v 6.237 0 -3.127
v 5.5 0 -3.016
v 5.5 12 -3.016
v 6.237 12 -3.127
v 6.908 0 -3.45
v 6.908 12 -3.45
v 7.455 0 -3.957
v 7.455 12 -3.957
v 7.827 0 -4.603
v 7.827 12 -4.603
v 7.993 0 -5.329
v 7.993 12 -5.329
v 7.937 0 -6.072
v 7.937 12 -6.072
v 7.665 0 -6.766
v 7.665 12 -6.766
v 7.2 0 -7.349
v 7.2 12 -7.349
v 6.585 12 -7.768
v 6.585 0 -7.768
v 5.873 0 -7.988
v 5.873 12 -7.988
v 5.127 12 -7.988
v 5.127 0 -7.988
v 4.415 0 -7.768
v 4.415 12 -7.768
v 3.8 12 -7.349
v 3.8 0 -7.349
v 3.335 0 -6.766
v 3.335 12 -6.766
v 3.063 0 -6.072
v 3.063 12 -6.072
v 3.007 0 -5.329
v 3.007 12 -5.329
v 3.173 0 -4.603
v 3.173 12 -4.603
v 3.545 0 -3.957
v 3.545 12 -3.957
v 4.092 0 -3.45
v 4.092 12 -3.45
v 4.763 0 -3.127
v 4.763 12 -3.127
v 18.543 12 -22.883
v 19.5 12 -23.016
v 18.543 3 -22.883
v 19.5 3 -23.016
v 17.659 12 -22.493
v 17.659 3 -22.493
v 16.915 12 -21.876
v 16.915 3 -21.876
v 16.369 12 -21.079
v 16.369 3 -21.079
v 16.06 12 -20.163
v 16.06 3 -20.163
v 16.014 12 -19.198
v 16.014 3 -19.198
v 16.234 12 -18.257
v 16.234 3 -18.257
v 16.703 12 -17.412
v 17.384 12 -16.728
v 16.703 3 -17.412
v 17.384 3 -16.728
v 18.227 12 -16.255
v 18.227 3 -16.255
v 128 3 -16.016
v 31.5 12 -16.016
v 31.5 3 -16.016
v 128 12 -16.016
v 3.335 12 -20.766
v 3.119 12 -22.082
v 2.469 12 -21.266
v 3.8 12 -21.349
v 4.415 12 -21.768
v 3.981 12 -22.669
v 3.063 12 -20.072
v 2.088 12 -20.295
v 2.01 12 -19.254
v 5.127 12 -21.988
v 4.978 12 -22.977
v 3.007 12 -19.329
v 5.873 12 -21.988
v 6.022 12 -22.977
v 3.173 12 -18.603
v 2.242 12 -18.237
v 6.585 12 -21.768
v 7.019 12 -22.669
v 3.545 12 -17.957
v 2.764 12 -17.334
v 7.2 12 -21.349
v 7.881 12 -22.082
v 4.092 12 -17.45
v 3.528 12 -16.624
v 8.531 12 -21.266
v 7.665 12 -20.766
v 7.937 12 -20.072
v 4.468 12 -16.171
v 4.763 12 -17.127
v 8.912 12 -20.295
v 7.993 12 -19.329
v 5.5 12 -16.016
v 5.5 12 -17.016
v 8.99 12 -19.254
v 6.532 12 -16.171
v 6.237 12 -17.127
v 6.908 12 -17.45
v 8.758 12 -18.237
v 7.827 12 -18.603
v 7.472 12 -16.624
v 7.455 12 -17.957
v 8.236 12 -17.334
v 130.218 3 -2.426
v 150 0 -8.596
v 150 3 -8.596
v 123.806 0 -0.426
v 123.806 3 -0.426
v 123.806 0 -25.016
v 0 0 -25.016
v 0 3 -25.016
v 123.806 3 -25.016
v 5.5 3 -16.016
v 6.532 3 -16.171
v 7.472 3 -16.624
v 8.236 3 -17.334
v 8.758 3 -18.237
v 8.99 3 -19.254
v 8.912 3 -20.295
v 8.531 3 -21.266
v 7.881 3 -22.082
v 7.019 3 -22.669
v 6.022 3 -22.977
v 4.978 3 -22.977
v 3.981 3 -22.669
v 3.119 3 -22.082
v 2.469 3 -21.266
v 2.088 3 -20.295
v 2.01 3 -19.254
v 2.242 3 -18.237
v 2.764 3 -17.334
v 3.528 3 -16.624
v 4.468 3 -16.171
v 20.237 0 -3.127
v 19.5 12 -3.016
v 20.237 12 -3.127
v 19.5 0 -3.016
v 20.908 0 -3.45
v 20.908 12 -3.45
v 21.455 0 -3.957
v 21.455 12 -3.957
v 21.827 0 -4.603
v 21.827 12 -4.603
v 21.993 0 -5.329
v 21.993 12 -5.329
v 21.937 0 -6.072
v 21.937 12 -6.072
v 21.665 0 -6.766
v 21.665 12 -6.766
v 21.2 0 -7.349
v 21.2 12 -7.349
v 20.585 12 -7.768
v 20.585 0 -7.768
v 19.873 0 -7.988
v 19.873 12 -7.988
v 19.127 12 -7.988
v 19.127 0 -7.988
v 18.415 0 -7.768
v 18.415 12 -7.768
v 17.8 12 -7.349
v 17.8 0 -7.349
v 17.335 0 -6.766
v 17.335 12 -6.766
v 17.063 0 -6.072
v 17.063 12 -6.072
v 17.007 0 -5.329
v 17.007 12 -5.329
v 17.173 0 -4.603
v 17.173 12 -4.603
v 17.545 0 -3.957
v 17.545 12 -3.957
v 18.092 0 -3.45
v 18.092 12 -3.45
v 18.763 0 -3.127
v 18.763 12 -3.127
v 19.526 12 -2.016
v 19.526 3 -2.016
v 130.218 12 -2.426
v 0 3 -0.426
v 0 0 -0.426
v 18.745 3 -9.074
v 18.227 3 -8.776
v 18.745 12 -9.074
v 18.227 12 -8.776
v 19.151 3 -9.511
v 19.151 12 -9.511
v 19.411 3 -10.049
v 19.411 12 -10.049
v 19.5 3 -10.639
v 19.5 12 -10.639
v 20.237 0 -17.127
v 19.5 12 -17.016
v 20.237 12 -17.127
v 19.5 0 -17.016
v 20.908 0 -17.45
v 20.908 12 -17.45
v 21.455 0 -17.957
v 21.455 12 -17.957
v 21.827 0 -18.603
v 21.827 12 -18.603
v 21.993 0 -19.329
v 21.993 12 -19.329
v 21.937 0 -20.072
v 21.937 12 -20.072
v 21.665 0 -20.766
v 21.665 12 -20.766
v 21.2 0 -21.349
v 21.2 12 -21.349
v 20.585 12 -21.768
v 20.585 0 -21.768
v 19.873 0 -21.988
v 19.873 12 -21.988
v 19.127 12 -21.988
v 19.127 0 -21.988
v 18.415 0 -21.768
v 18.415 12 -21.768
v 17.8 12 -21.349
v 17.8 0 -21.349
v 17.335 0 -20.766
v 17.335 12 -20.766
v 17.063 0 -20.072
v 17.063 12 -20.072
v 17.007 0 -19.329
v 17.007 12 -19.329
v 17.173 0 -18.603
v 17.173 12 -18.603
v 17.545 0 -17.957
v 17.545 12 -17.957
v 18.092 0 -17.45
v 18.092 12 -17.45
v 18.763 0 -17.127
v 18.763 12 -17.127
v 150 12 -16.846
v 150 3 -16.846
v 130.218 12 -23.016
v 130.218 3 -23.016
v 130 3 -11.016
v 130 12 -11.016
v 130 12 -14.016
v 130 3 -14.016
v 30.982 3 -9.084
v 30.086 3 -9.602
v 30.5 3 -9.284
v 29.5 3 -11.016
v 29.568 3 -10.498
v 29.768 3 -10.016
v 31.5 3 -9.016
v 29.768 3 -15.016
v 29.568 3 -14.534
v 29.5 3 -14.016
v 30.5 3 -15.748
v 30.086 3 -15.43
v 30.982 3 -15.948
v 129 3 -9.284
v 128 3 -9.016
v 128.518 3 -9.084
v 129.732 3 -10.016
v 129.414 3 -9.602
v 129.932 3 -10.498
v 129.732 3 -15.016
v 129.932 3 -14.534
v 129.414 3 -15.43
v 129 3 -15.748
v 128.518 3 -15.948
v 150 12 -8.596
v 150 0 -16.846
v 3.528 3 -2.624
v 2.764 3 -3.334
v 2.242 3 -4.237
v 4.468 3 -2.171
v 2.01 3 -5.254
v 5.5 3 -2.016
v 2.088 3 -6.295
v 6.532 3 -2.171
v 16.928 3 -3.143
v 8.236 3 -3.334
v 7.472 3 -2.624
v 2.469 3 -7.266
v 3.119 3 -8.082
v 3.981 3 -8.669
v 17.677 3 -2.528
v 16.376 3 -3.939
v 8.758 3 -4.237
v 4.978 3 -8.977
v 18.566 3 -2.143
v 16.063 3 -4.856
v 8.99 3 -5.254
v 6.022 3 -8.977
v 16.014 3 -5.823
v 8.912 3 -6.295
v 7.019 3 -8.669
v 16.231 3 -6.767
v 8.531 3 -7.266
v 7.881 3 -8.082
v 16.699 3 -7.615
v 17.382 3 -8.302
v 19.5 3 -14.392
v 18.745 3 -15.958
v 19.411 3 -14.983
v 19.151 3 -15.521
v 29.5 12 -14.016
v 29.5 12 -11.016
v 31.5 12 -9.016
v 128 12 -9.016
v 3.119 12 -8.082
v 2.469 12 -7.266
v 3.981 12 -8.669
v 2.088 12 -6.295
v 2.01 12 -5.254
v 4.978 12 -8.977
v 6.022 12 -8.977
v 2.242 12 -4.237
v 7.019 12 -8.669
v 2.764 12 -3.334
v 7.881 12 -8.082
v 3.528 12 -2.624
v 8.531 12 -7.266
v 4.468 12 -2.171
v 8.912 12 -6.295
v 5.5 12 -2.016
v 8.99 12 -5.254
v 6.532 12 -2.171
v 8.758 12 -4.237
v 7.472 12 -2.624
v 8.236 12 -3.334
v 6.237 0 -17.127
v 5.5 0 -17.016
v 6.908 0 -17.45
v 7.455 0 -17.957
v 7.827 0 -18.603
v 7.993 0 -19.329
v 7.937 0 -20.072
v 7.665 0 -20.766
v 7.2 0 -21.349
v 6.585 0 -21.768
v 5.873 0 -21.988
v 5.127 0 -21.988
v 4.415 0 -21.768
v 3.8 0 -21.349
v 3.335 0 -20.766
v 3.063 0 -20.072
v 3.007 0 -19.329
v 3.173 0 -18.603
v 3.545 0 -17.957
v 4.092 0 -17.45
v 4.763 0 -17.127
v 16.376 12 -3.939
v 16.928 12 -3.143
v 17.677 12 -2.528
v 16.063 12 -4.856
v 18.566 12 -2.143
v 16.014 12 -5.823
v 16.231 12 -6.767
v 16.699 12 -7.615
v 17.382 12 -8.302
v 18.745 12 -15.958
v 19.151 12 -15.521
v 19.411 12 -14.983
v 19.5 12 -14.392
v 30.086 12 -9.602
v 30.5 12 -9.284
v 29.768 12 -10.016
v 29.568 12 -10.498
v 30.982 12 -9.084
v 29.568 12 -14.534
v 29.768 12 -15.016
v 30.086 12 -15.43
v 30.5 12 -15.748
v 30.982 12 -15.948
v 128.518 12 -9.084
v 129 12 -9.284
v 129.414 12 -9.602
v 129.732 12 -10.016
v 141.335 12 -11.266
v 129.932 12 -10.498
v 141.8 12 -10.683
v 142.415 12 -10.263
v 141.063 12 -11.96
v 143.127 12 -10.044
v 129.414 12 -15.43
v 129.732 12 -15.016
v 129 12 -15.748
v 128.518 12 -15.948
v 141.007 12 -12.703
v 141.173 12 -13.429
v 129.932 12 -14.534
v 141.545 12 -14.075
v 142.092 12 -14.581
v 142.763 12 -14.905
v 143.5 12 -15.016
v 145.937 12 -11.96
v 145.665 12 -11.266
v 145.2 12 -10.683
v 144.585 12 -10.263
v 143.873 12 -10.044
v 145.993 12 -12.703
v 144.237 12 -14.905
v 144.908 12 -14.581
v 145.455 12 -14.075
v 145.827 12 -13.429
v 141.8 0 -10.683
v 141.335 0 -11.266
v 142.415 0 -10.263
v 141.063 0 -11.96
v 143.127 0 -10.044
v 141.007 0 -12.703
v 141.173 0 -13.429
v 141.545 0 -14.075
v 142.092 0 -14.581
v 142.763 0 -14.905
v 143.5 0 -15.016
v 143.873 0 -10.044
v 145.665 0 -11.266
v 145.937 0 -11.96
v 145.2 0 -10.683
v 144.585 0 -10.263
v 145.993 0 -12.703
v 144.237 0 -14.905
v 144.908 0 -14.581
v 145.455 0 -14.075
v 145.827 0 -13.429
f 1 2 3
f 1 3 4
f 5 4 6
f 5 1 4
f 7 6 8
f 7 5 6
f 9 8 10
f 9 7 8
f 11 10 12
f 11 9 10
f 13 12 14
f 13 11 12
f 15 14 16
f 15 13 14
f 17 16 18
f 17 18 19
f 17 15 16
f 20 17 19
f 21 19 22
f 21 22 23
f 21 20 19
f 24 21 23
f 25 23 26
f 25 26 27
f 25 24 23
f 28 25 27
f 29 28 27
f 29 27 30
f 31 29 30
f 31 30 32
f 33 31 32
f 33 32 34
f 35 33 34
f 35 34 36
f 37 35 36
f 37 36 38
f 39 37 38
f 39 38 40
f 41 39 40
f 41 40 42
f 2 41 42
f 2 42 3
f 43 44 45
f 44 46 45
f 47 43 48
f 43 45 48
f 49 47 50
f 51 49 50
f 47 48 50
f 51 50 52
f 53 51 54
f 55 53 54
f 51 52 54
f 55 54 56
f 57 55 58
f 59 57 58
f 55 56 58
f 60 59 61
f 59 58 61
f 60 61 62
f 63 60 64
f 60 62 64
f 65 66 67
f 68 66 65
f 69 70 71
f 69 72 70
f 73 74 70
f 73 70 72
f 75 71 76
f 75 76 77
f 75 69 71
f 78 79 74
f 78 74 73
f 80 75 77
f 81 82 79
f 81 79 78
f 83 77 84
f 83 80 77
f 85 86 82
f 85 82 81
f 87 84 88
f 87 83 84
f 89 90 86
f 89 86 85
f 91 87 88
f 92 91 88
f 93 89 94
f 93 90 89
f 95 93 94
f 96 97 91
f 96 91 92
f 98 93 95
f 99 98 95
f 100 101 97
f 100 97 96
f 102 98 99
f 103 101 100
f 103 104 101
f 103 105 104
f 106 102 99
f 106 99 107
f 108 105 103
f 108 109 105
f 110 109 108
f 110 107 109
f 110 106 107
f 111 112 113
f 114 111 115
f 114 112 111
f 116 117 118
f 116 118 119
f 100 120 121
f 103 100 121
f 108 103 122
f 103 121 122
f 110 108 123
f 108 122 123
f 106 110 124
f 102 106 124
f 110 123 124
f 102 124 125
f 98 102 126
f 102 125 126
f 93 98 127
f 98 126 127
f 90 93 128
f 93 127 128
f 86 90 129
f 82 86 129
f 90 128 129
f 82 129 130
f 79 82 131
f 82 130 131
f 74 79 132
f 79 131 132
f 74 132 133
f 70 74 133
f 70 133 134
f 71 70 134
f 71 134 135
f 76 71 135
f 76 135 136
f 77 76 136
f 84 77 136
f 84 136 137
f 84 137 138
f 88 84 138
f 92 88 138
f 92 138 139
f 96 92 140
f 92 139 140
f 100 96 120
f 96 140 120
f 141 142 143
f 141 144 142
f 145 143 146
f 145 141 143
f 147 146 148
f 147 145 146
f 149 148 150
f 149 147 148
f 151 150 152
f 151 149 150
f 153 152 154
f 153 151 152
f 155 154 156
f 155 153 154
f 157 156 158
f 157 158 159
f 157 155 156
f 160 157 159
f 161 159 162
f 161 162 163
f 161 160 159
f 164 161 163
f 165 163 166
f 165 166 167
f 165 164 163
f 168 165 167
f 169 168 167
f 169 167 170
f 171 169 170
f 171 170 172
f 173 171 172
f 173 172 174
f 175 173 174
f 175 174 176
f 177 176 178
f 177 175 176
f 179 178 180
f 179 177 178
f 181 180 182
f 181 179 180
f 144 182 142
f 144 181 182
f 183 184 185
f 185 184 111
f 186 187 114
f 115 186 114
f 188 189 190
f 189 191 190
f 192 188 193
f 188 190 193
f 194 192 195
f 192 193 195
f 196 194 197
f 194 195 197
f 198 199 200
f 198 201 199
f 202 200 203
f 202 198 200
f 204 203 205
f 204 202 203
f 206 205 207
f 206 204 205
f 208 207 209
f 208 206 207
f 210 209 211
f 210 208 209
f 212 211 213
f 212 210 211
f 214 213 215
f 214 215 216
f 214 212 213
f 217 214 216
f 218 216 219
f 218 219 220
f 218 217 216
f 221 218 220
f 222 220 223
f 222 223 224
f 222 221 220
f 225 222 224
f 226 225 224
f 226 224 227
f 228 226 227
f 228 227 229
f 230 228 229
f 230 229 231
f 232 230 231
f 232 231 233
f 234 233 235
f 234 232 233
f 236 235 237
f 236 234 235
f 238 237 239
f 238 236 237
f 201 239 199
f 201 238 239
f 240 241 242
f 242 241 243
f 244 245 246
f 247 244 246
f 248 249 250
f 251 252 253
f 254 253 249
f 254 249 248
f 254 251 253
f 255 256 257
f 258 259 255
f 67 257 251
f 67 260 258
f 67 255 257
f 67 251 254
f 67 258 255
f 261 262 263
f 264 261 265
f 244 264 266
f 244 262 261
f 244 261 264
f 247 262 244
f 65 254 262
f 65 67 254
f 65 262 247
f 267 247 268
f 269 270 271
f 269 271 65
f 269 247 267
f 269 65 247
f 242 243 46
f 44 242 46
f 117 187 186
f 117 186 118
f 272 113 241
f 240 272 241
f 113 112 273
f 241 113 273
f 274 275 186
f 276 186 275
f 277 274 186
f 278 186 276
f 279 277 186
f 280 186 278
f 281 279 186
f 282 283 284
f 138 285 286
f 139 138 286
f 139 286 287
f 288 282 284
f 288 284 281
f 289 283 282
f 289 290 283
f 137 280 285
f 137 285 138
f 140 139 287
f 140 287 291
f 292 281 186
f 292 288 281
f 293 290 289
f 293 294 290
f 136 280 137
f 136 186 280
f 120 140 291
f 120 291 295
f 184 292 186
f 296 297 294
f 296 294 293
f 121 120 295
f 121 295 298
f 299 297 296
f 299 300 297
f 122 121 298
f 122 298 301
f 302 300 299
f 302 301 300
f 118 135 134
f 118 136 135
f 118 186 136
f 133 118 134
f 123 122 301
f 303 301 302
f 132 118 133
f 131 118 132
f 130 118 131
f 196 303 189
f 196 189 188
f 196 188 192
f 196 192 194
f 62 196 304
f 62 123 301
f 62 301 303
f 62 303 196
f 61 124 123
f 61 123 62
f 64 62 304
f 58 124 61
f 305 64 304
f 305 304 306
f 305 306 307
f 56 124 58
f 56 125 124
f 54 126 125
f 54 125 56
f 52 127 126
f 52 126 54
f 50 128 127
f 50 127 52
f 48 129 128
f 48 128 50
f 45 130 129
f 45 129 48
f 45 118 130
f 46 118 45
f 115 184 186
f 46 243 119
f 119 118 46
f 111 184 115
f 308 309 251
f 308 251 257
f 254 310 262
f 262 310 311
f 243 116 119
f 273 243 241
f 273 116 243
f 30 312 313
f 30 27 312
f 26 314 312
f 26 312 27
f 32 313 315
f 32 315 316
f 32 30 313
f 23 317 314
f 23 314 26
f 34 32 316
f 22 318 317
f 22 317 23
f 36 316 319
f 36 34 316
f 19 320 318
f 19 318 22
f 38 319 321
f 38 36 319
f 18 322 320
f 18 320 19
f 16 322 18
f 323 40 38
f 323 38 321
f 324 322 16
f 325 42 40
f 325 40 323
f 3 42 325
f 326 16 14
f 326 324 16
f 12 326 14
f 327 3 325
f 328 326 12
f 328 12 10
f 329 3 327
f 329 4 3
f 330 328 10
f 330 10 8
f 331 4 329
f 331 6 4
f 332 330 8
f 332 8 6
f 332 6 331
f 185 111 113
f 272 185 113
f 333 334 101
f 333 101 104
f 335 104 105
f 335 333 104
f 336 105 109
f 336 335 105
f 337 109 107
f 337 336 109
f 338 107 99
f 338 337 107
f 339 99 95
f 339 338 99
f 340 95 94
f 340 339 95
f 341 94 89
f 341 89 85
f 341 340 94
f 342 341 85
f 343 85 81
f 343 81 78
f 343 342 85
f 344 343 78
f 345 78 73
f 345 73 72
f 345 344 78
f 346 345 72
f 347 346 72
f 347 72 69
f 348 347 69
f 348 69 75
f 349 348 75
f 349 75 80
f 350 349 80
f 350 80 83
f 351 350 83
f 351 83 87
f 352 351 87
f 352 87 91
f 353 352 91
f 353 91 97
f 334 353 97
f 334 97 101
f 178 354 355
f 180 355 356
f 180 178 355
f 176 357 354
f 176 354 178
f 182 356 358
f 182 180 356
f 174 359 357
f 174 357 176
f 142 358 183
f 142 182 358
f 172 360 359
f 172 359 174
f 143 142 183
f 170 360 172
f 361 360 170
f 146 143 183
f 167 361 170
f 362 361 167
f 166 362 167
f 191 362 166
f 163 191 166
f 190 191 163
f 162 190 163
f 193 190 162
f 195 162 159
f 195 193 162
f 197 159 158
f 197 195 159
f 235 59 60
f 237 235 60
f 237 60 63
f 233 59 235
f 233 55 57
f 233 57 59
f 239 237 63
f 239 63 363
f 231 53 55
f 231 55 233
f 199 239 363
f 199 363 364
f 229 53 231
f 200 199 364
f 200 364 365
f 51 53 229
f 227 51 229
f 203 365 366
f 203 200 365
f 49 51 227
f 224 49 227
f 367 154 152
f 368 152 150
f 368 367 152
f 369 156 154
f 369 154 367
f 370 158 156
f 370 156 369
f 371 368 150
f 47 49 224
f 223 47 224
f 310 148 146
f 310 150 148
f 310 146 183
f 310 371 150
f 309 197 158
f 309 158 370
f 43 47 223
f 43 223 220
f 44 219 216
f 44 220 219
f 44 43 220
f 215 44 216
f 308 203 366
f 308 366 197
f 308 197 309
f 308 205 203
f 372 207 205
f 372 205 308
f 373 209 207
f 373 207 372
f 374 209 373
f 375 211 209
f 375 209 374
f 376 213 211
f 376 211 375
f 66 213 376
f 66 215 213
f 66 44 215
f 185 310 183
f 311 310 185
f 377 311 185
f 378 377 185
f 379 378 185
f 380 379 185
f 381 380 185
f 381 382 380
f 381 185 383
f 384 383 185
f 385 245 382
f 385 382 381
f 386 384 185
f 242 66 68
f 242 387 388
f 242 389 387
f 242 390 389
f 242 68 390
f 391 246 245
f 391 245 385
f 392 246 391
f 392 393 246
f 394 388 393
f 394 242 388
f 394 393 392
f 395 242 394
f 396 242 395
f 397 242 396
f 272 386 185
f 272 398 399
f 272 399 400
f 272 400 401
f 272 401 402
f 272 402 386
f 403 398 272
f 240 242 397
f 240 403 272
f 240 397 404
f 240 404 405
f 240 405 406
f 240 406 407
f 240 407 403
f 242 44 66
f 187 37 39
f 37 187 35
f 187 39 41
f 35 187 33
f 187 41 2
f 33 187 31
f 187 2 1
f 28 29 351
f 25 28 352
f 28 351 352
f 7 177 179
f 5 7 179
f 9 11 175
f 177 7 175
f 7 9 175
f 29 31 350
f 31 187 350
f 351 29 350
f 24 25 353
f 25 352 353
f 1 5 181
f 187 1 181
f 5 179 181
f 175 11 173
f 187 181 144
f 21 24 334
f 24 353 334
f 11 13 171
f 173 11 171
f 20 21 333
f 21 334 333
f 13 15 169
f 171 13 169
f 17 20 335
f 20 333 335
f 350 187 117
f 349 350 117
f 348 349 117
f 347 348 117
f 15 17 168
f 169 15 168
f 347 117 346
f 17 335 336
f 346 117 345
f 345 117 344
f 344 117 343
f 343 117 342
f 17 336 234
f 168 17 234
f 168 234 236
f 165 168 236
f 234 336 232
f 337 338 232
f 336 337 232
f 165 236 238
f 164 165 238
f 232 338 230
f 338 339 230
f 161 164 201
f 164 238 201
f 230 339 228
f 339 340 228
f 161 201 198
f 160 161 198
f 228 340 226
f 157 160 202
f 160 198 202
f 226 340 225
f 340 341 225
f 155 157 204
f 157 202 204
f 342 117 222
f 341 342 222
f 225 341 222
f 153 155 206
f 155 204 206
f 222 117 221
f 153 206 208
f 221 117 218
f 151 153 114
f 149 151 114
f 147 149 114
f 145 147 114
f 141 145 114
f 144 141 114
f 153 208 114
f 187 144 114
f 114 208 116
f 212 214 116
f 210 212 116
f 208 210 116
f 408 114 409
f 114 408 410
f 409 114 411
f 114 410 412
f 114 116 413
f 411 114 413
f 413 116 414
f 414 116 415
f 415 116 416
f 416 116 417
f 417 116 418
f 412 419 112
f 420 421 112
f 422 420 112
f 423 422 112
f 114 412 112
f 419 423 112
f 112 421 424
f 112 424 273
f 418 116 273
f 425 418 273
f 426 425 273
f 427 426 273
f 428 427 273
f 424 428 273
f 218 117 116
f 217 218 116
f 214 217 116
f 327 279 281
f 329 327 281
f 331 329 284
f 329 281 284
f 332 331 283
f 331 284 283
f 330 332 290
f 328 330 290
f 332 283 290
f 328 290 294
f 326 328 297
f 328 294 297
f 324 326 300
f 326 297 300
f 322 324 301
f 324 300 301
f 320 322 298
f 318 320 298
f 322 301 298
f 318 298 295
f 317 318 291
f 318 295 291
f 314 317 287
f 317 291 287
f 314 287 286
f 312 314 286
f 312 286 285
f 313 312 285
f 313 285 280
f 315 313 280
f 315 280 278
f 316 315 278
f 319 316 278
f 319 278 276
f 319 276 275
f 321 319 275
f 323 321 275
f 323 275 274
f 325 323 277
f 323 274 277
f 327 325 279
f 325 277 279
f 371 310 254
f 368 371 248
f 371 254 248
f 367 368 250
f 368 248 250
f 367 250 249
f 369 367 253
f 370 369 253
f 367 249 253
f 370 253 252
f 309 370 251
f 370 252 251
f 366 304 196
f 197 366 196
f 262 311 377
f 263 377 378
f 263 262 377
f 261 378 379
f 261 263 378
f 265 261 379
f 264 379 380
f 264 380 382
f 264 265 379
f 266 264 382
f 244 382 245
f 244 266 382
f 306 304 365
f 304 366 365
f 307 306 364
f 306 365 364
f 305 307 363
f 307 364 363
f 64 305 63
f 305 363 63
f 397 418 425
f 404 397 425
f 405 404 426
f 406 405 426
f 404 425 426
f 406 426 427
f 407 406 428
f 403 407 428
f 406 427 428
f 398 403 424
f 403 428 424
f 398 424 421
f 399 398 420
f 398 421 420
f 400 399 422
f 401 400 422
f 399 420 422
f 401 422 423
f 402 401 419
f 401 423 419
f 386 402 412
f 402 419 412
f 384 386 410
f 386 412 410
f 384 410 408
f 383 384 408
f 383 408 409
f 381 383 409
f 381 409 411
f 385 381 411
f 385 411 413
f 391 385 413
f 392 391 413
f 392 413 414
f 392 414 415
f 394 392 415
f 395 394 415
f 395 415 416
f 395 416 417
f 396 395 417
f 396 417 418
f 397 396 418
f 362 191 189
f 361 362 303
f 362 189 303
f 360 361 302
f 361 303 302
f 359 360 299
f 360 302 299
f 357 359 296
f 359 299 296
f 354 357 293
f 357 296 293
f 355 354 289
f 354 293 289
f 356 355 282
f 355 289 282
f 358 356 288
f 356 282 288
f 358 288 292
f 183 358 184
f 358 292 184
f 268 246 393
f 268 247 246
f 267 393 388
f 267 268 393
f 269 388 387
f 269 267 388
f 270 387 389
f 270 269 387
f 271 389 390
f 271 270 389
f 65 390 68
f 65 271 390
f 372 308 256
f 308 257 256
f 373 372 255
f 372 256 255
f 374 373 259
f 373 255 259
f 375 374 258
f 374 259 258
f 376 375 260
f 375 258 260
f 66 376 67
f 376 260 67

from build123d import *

# Parameters (mm, degrees)
SKETCH_2_W          = 123.80594
SKETCH_2_H          = 24.590071156
EXTRUDE_2_DEPTH     = 3
SKETCH_3_R          = 3.5
SKETCH_3_R_2        = 2.5
EXTRUDE_3_DEPTH     = 9
EXTRUDE_4_DEPTH     = 9
SKETCH_7_W          = 100.499997397
SKETCH_7_H          = 7
CUT_EXTRUDE_1_DEPTH = 9
SKETCH_8_R          = 2.5
CUT_EXTRUDE_2_DEPTH = 153.544398733
FILLET_1_R          = 2
CUT_EXTRUDE_START   = -9
SKETCH_9_R          = 2.5
CUT_EXTRUDE_3_DEPTH = 9


# Read off the part's stored shape, not the designer's step: 凸台-拉伸4
with BuildPart() as part:
    # 草图2 → 凸台-拉伸2 (new body)
    with BuildSketch(Plane(origin=(0, 0, 0), x_dir=(1, 0, 0), z_dir=(0, 1, 0))):
        with Locations((61.90297, 12.720846688)):
            Rectangle(SKETCH_2_W, SKETCH_2_H)
        Polygon((149.999997397, 8.59581111), (123.80594, 0.42581111), (123.80594, 25.015882266), (149.999997397, 16.845882266), align=None)
    extrude(amount=EXTRUDE_2_DEPTH)

    # 草图3 → 凸台-拉伸3 (add)
    # profile 1 of 4: a face of its own
    with BuildSketch(Plane(origin=(0, 3, 0), x_dir=(1, 0, 0), z_dir=(0, 1, 0))):
        with Locations(Location((5.5, 19.515882266, 0), (0, 0, 270))):
            Circle(SKETCH_3_R)
        with Locations(Location((5.5, 19.515882266, 0), (0, 0, 270))):
            Circle(SKETCH_3_R_2, mode=Mode.SUBTRACT)
    # profile 2 of 4: a face of its own
    with BuildSketch(Plane(origin=(0, 3, 0), x_dir=(1, 0, 0), z_dir=(0, 1, 0))):
        with Locations(Location((19.5, 19.515882266, 0), (0, 0, 270))):
            Circle(SKETCH_3_R)
        with Locations(Location((19.5, 19.515882266, 0), (0, 0, 270))):
            Circle(SKETCH_3_R_2, mode=Mode.SUBTRACT)
    # profile 3 of 4: a face of its own
    with BuildSketch(Plane(origin=(0, 3, 0), x_dir=(1, 0, 0), z_dir=(0, 1, 0))):
        with Locations(Location((19.5, 5.515882266, 0), (0, 0, 270))):
            Circle(SKETCH_3_R)
        with Locations(Location((19.5, 5.515882266, 0), (0, 0, 270))):
            Circle(SKETCH_3_R_2, mode=Mode.SUBTRACT)
    # profile 4 of 4: a face of its own
    with BuildSketch(Plane(origin=(0, 3, 0), x_dir=(1, 0, 0), z_dir=(0, 1, 0))):
        with Locations(Location((5.5, 5.515882266, 0), (0, 0, 270))):
            Circle(SKETCH_3_R)
        with Locations(Location((5.5, 5.515882266, 0), (0, 0, 270))):
            Circle(SKETCH_3_R_2, mode=Mode.SUBTRACT)
    extrude(amount=EXTRUDE_3_DEPTH)

    # 凸台-拉伸4 outline → 凸台-拉伸4 (add)
    with BuildSketch(Plane(origin=(0, 3, 0), x_dir=(1, 0, 0), z_dir=(0, 1, 0))):
        with BuildLine():
            Line((19.525916812, 2.015978222), (130.218193953, 2.42581111))
            Line((130.218193953, 2.42581111), (149.999997397, 8.59581111))
            Line((149.999997397, 8.59581111), (149.999997397, 16.845882266))
            Line((149.999997397, 16.845882266), (130.218193953, 23.015882266))
            Line((130.218193953, 23.015882266), (19.5, 23.015882266))
            ThreePointArc((19.5, 23.015882266), (23, 19.515882266), (19.5, 16.015882266))
            Line((19.5, 16.015882266), (19.5, 9.015882266))
            ThreePointArc((19.5, 9.015882266), (22.999976011, 5.528840761), (19.525916812, 2.015978222))
        make_face()
    extrude(amount=EXTRUDE_4_DEPTH)

    # 草图7 → 切除-拉伸1 (cut)
    with BuildSketch(Plane(origin=(0, 12, 0), x_dir=(1, 0, 0), z_dir=(0, 1, 0))):
        with Locations((79.749998699, 12.515882266)):
            Rectangle(SKETCH_7_W, SKETCH_7_H)
    extrude(amount=-CUT_EXTRUDE_1_DEPTH, mode=Mode.SUBTRACT)

    # 草图8 → 切除-拉伸2 (cut, through all)
    with BuildSketch(Plane.XZ):
        with Locations(Location((143.499997397, -12.515882266, 0), (0, 0, 270))):
            Circle(SKETCH_8_R)
    extrude(amount=-CUT_EXTRUDE_2_DEPTH, mode=Mode.SUBTRACT)

    # 圆角1
    fillet_1_edges = [part.edges().sort_by_distance(p)[0] for p in [
        (19.5, 7.5, -16.015882266),
        (19.5, 7.5, -9.015882266),
        (29.5, 7.5, -9.015882266),
        (29.5, 7.5, -16.015882266),
        (129.999997397, 7.5, -16.015882266),
        (129.999997397, 7.5, -9.015882266),
    ]]
    fillet(fillet_1_edges, radius=FILLET_1_R)

    # 草图9 → 切除-拉伸3 (cut)
    with BuildSketch(Plane(origin=(0, 3, 0), x_dir=(1, 0, 0), z_dir=(0, 1, 0)).offset(CUT_EXTRUDE_START)):
        with Locations(Location((5.5, 5.515882266, 0), (0, 0, 270))):
            Circle(SKETCH_9_R)
        with Locations(Location((19.5, 5.515882266, 0), (0, 0, 270))):
            Circle(SKETCH_9_R)
        with Locations(Location((19.5, 19.515882266, 0), (0, 0, 270))):
            Circle(SKETCH_9_R)
        with Locations(Location((5.5, 19.515882266, 0), (0, 0, 270))):
            Circle(SKETCH_9_R)
    extrude(amount=CUT_EXTRUDE_3_DEPTH, mode=Mode.SUBTRACT)


solid = part.part
